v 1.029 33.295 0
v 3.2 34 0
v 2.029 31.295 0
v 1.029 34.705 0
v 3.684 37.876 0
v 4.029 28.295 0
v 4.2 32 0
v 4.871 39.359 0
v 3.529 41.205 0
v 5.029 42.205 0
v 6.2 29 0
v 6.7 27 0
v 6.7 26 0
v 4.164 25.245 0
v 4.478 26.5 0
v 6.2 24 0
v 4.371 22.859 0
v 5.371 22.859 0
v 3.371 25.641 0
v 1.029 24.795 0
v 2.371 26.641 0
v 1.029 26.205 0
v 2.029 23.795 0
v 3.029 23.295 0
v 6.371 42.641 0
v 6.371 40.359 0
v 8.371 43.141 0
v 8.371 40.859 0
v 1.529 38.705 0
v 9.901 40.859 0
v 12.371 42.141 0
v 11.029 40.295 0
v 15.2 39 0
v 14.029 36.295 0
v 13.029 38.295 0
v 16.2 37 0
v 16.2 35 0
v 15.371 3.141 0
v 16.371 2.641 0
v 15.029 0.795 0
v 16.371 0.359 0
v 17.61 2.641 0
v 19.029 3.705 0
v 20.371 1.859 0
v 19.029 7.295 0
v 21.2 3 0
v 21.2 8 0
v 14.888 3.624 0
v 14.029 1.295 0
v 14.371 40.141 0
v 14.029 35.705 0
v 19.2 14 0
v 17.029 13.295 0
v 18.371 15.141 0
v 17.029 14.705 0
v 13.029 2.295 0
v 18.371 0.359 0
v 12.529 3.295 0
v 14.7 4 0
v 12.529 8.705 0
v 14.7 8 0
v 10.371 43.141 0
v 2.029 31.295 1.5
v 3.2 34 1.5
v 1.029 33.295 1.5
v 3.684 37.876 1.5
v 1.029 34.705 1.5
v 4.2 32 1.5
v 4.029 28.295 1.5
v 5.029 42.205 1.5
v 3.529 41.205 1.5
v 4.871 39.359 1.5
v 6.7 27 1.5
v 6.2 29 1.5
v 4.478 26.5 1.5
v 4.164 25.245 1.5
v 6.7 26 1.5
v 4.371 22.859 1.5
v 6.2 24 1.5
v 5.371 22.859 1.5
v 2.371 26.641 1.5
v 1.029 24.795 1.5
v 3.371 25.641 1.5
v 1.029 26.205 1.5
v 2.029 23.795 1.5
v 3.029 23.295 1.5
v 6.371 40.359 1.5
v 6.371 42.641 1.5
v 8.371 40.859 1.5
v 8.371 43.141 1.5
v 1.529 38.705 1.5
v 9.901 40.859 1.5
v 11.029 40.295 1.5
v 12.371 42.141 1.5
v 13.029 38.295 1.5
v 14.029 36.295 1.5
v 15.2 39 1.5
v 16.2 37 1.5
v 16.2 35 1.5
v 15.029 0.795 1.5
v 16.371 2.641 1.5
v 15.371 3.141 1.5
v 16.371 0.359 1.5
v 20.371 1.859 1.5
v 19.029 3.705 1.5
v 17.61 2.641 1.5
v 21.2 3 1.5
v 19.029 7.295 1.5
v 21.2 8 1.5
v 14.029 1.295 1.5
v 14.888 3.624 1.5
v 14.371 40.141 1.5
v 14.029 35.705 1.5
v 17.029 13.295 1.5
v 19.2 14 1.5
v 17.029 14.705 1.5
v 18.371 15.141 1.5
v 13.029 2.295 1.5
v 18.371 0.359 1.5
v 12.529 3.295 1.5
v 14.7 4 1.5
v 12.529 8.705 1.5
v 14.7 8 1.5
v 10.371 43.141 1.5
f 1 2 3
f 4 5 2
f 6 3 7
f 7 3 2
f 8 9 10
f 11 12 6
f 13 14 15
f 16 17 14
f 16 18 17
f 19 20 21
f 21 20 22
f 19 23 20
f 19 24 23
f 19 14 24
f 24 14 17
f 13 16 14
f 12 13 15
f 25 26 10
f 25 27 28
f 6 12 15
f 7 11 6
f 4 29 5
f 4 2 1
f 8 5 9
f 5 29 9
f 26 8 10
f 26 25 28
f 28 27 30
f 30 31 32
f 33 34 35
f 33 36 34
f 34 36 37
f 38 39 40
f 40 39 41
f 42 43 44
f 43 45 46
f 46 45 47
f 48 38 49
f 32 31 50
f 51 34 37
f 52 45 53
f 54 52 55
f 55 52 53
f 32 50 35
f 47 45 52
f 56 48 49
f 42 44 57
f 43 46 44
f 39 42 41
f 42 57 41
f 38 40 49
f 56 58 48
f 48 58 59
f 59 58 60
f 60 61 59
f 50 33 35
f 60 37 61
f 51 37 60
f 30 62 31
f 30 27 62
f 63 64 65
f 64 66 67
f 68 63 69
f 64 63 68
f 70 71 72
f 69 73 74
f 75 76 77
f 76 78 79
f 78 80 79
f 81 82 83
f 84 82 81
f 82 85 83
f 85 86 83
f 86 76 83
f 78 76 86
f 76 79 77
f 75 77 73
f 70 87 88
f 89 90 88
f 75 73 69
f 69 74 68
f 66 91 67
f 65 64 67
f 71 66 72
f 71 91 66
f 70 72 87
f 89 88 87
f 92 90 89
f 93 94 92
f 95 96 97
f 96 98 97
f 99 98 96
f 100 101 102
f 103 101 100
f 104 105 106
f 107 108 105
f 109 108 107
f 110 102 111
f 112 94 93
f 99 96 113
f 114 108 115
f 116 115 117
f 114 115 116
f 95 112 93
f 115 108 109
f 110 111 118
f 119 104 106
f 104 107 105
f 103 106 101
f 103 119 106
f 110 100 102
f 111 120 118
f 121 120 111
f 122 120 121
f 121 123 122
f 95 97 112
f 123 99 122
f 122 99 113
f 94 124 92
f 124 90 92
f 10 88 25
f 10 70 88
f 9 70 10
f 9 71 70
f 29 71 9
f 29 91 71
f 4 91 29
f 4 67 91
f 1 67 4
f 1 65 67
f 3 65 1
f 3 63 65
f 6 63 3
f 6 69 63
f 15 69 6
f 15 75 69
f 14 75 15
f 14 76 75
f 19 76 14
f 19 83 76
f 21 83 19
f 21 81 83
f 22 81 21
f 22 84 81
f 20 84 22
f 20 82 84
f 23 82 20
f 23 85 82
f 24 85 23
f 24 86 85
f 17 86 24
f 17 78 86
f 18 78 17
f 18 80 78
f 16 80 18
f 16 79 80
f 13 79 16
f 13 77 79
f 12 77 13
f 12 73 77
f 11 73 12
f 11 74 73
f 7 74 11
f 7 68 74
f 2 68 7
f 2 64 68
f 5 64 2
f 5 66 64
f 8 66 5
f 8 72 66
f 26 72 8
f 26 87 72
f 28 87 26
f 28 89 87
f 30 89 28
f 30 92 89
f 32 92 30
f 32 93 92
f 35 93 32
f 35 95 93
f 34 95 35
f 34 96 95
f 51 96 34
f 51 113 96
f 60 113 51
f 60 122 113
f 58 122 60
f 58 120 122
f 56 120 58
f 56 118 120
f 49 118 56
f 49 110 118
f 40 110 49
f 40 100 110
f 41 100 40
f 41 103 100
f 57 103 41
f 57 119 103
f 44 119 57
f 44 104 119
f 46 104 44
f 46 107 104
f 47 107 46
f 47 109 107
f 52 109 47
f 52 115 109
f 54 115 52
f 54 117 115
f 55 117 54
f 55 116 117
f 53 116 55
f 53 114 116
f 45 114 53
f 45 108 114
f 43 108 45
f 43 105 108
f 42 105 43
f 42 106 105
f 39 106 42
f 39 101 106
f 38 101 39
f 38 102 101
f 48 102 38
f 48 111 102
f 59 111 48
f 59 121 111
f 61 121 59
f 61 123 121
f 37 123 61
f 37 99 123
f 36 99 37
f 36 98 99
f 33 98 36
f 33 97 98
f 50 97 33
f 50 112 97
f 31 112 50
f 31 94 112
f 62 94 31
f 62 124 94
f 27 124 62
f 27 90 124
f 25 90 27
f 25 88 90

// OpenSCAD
points = [
  [18, 14],
  [20, 8],
  [20, 3],
  [18, 1.5],
  [16, 1.5],
  [15, 2],
  [14, 3],
  [13.5, 4],
  [13.5, 8],
  [15, 35],
  [15, 37],
  [14, 39],
  [12, 41],
  [10, 42],
  [8, 42],
  [6, 41.5],
  [4.5, 40.5],
  [2.5, 38],
  [2, 34],
  [3, 32],
  [5, 29],
  [5.5, 27],
  [5.5, 26],
  [5, 24],
  [4, 24],
  [3, 24.5],
  [2, 25.5]
];

assert(len(points) > 1, "Error: too few points");

linear_extrude(height = 1.5) for (idx = [0 : len(points) - 2]) hull() {
  translate(points[idx]) circle(r = 1.2);
  translate(points[idx + 1]) circle(r = 1.2);
}
